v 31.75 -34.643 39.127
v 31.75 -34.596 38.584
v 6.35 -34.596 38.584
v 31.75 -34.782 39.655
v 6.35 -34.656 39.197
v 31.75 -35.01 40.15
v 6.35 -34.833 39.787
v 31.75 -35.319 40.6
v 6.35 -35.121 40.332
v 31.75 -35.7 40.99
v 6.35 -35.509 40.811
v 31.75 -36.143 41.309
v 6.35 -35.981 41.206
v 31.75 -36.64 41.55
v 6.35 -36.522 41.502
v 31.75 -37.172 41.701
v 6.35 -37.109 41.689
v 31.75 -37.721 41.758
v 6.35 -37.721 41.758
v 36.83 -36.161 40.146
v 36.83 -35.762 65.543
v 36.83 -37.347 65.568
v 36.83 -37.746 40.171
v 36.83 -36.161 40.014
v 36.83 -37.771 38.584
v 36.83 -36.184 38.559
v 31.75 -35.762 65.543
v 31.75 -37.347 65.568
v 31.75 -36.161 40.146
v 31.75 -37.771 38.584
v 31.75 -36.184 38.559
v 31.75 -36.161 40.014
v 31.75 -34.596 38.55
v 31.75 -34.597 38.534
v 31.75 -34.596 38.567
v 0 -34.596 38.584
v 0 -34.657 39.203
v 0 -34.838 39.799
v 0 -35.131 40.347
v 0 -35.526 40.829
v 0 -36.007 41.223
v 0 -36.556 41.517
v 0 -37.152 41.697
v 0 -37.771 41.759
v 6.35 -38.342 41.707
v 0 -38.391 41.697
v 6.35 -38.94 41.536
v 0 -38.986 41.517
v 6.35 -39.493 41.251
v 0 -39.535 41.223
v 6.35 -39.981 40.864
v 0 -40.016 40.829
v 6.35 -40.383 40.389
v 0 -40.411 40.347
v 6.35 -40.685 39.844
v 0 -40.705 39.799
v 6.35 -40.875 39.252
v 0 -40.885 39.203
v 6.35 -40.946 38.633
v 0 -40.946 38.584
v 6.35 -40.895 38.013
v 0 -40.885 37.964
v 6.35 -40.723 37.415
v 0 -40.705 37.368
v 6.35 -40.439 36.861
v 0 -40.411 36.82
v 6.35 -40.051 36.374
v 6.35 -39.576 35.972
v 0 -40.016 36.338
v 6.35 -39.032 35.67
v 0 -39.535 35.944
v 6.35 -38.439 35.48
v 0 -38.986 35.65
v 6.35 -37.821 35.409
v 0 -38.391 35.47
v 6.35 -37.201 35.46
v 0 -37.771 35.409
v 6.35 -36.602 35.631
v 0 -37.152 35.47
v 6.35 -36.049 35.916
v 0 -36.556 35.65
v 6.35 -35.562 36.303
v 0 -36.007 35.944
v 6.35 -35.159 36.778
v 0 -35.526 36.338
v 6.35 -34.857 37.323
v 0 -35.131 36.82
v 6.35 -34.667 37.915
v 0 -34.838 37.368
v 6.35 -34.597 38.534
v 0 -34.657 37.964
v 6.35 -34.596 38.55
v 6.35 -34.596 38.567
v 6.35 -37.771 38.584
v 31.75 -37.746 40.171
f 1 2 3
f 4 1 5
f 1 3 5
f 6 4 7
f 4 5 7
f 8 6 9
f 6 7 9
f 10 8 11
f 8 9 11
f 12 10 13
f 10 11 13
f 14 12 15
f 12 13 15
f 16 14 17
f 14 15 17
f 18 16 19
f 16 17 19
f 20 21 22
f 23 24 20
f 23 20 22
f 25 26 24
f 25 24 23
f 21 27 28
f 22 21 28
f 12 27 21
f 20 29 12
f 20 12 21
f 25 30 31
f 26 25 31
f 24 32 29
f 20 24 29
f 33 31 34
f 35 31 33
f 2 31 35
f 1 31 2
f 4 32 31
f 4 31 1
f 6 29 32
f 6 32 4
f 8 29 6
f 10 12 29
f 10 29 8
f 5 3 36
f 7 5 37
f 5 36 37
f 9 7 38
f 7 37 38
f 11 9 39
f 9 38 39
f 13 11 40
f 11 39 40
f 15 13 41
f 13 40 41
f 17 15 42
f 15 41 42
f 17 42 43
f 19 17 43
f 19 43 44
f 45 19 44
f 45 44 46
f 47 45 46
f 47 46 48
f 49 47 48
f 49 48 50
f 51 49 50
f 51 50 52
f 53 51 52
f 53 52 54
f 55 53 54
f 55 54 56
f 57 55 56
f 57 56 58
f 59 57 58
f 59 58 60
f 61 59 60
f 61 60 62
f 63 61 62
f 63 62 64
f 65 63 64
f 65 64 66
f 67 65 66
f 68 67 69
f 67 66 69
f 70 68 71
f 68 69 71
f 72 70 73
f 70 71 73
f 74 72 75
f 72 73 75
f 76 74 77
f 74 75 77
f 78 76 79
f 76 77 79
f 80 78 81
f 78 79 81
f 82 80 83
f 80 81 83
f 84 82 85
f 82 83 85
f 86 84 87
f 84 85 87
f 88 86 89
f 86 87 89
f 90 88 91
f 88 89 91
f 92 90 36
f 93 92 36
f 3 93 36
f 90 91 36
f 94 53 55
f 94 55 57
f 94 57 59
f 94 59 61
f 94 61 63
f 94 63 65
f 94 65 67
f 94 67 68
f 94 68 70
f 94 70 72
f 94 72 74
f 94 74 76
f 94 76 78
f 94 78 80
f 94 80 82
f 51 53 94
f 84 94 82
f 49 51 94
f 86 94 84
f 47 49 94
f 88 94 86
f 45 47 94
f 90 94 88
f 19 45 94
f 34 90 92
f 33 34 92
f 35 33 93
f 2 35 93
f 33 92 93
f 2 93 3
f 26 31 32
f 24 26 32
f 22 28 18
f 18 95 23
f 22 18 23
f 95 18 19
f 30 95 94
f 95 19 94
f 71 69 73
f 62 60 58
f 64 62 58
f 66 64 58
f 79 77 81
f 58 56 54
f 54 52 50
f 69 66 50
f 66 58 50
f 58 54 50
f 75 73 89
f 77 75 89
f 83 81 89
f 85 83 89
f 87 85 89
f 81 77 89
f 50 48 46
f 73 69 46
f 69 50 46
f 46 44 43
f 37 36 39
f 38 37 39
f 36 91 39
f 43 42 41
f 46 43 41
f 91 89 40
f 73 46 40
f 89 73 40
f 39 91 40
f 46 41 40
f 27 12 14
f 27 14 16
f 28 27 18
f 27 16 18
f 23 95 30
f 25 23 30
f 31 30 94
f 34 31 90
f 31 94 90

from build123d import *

# Parameters (mm, degrees)
F0_R     = 3.175
F1_DEPTH = 6.35
F5_DEPTH = 25.4
F7_DEPTH = 5.08
F8_DEPTH = 25.4


# Not quite as in the source:
# - the program builds the solid bodies; features that only make, move or delete a surface that nothing else refers to are left out


with BuildPart() as f1:
    # F0 (on Right) → F1 (new body)
    with BuildSketch(Plane.YZ):
        with Locations((-37.7712212503, 38.5835021734)):
            Circle(F0_R)
    extrude(amount=F1_DEPTH)

    # F4 (on face) → F5 (join)
    with BuildSketch(Plane.YZ.offset(6.35)):
        with BuildLine():
            ThreePointArc((-34.5962212503, 38.5835021734), (-35.5085896731, 40.8108601029), (-37.7213383186, 41.7581102899))
            Line((-37.7213383186, 41.7581102899), (-37.7712212503, 38.5835021734))
            Line((-37.7712212503, 38.5835021734), (-34.5966131338, 38.5336192417))
            ThreePointArc((-34.5966131338, 38.5336192417), (-34.5963192227, 38.5585599379), (-34.5962212503, 38.5835021734))
        make_face()
    extrude(amount=F5_DEPTH)

    # F6 (on face) → F7 (join)
    with BuildSketch(Plane.YZ.offset(31.75)):
        Polygon((-37.7712212503, 38.5835021734), (-36.1839171921, 38.5585607076), (-36.1610525797, 40.0136913835), (-36.1610525797, 40.1458973996), (-37.7462797844, 40.1708062317), align=None)
    extrude(amount=F7_DEPTH)

    # F8 (add): a face of the model
    f8_faces = [f1.faces().sort_by_distance(p)[0] for p in [
        (34.29, -36.953666182, 40.1583518156),
    ]]
    extrude(f8_faces, amount=F8_DEPTH)


solid = f1.part
